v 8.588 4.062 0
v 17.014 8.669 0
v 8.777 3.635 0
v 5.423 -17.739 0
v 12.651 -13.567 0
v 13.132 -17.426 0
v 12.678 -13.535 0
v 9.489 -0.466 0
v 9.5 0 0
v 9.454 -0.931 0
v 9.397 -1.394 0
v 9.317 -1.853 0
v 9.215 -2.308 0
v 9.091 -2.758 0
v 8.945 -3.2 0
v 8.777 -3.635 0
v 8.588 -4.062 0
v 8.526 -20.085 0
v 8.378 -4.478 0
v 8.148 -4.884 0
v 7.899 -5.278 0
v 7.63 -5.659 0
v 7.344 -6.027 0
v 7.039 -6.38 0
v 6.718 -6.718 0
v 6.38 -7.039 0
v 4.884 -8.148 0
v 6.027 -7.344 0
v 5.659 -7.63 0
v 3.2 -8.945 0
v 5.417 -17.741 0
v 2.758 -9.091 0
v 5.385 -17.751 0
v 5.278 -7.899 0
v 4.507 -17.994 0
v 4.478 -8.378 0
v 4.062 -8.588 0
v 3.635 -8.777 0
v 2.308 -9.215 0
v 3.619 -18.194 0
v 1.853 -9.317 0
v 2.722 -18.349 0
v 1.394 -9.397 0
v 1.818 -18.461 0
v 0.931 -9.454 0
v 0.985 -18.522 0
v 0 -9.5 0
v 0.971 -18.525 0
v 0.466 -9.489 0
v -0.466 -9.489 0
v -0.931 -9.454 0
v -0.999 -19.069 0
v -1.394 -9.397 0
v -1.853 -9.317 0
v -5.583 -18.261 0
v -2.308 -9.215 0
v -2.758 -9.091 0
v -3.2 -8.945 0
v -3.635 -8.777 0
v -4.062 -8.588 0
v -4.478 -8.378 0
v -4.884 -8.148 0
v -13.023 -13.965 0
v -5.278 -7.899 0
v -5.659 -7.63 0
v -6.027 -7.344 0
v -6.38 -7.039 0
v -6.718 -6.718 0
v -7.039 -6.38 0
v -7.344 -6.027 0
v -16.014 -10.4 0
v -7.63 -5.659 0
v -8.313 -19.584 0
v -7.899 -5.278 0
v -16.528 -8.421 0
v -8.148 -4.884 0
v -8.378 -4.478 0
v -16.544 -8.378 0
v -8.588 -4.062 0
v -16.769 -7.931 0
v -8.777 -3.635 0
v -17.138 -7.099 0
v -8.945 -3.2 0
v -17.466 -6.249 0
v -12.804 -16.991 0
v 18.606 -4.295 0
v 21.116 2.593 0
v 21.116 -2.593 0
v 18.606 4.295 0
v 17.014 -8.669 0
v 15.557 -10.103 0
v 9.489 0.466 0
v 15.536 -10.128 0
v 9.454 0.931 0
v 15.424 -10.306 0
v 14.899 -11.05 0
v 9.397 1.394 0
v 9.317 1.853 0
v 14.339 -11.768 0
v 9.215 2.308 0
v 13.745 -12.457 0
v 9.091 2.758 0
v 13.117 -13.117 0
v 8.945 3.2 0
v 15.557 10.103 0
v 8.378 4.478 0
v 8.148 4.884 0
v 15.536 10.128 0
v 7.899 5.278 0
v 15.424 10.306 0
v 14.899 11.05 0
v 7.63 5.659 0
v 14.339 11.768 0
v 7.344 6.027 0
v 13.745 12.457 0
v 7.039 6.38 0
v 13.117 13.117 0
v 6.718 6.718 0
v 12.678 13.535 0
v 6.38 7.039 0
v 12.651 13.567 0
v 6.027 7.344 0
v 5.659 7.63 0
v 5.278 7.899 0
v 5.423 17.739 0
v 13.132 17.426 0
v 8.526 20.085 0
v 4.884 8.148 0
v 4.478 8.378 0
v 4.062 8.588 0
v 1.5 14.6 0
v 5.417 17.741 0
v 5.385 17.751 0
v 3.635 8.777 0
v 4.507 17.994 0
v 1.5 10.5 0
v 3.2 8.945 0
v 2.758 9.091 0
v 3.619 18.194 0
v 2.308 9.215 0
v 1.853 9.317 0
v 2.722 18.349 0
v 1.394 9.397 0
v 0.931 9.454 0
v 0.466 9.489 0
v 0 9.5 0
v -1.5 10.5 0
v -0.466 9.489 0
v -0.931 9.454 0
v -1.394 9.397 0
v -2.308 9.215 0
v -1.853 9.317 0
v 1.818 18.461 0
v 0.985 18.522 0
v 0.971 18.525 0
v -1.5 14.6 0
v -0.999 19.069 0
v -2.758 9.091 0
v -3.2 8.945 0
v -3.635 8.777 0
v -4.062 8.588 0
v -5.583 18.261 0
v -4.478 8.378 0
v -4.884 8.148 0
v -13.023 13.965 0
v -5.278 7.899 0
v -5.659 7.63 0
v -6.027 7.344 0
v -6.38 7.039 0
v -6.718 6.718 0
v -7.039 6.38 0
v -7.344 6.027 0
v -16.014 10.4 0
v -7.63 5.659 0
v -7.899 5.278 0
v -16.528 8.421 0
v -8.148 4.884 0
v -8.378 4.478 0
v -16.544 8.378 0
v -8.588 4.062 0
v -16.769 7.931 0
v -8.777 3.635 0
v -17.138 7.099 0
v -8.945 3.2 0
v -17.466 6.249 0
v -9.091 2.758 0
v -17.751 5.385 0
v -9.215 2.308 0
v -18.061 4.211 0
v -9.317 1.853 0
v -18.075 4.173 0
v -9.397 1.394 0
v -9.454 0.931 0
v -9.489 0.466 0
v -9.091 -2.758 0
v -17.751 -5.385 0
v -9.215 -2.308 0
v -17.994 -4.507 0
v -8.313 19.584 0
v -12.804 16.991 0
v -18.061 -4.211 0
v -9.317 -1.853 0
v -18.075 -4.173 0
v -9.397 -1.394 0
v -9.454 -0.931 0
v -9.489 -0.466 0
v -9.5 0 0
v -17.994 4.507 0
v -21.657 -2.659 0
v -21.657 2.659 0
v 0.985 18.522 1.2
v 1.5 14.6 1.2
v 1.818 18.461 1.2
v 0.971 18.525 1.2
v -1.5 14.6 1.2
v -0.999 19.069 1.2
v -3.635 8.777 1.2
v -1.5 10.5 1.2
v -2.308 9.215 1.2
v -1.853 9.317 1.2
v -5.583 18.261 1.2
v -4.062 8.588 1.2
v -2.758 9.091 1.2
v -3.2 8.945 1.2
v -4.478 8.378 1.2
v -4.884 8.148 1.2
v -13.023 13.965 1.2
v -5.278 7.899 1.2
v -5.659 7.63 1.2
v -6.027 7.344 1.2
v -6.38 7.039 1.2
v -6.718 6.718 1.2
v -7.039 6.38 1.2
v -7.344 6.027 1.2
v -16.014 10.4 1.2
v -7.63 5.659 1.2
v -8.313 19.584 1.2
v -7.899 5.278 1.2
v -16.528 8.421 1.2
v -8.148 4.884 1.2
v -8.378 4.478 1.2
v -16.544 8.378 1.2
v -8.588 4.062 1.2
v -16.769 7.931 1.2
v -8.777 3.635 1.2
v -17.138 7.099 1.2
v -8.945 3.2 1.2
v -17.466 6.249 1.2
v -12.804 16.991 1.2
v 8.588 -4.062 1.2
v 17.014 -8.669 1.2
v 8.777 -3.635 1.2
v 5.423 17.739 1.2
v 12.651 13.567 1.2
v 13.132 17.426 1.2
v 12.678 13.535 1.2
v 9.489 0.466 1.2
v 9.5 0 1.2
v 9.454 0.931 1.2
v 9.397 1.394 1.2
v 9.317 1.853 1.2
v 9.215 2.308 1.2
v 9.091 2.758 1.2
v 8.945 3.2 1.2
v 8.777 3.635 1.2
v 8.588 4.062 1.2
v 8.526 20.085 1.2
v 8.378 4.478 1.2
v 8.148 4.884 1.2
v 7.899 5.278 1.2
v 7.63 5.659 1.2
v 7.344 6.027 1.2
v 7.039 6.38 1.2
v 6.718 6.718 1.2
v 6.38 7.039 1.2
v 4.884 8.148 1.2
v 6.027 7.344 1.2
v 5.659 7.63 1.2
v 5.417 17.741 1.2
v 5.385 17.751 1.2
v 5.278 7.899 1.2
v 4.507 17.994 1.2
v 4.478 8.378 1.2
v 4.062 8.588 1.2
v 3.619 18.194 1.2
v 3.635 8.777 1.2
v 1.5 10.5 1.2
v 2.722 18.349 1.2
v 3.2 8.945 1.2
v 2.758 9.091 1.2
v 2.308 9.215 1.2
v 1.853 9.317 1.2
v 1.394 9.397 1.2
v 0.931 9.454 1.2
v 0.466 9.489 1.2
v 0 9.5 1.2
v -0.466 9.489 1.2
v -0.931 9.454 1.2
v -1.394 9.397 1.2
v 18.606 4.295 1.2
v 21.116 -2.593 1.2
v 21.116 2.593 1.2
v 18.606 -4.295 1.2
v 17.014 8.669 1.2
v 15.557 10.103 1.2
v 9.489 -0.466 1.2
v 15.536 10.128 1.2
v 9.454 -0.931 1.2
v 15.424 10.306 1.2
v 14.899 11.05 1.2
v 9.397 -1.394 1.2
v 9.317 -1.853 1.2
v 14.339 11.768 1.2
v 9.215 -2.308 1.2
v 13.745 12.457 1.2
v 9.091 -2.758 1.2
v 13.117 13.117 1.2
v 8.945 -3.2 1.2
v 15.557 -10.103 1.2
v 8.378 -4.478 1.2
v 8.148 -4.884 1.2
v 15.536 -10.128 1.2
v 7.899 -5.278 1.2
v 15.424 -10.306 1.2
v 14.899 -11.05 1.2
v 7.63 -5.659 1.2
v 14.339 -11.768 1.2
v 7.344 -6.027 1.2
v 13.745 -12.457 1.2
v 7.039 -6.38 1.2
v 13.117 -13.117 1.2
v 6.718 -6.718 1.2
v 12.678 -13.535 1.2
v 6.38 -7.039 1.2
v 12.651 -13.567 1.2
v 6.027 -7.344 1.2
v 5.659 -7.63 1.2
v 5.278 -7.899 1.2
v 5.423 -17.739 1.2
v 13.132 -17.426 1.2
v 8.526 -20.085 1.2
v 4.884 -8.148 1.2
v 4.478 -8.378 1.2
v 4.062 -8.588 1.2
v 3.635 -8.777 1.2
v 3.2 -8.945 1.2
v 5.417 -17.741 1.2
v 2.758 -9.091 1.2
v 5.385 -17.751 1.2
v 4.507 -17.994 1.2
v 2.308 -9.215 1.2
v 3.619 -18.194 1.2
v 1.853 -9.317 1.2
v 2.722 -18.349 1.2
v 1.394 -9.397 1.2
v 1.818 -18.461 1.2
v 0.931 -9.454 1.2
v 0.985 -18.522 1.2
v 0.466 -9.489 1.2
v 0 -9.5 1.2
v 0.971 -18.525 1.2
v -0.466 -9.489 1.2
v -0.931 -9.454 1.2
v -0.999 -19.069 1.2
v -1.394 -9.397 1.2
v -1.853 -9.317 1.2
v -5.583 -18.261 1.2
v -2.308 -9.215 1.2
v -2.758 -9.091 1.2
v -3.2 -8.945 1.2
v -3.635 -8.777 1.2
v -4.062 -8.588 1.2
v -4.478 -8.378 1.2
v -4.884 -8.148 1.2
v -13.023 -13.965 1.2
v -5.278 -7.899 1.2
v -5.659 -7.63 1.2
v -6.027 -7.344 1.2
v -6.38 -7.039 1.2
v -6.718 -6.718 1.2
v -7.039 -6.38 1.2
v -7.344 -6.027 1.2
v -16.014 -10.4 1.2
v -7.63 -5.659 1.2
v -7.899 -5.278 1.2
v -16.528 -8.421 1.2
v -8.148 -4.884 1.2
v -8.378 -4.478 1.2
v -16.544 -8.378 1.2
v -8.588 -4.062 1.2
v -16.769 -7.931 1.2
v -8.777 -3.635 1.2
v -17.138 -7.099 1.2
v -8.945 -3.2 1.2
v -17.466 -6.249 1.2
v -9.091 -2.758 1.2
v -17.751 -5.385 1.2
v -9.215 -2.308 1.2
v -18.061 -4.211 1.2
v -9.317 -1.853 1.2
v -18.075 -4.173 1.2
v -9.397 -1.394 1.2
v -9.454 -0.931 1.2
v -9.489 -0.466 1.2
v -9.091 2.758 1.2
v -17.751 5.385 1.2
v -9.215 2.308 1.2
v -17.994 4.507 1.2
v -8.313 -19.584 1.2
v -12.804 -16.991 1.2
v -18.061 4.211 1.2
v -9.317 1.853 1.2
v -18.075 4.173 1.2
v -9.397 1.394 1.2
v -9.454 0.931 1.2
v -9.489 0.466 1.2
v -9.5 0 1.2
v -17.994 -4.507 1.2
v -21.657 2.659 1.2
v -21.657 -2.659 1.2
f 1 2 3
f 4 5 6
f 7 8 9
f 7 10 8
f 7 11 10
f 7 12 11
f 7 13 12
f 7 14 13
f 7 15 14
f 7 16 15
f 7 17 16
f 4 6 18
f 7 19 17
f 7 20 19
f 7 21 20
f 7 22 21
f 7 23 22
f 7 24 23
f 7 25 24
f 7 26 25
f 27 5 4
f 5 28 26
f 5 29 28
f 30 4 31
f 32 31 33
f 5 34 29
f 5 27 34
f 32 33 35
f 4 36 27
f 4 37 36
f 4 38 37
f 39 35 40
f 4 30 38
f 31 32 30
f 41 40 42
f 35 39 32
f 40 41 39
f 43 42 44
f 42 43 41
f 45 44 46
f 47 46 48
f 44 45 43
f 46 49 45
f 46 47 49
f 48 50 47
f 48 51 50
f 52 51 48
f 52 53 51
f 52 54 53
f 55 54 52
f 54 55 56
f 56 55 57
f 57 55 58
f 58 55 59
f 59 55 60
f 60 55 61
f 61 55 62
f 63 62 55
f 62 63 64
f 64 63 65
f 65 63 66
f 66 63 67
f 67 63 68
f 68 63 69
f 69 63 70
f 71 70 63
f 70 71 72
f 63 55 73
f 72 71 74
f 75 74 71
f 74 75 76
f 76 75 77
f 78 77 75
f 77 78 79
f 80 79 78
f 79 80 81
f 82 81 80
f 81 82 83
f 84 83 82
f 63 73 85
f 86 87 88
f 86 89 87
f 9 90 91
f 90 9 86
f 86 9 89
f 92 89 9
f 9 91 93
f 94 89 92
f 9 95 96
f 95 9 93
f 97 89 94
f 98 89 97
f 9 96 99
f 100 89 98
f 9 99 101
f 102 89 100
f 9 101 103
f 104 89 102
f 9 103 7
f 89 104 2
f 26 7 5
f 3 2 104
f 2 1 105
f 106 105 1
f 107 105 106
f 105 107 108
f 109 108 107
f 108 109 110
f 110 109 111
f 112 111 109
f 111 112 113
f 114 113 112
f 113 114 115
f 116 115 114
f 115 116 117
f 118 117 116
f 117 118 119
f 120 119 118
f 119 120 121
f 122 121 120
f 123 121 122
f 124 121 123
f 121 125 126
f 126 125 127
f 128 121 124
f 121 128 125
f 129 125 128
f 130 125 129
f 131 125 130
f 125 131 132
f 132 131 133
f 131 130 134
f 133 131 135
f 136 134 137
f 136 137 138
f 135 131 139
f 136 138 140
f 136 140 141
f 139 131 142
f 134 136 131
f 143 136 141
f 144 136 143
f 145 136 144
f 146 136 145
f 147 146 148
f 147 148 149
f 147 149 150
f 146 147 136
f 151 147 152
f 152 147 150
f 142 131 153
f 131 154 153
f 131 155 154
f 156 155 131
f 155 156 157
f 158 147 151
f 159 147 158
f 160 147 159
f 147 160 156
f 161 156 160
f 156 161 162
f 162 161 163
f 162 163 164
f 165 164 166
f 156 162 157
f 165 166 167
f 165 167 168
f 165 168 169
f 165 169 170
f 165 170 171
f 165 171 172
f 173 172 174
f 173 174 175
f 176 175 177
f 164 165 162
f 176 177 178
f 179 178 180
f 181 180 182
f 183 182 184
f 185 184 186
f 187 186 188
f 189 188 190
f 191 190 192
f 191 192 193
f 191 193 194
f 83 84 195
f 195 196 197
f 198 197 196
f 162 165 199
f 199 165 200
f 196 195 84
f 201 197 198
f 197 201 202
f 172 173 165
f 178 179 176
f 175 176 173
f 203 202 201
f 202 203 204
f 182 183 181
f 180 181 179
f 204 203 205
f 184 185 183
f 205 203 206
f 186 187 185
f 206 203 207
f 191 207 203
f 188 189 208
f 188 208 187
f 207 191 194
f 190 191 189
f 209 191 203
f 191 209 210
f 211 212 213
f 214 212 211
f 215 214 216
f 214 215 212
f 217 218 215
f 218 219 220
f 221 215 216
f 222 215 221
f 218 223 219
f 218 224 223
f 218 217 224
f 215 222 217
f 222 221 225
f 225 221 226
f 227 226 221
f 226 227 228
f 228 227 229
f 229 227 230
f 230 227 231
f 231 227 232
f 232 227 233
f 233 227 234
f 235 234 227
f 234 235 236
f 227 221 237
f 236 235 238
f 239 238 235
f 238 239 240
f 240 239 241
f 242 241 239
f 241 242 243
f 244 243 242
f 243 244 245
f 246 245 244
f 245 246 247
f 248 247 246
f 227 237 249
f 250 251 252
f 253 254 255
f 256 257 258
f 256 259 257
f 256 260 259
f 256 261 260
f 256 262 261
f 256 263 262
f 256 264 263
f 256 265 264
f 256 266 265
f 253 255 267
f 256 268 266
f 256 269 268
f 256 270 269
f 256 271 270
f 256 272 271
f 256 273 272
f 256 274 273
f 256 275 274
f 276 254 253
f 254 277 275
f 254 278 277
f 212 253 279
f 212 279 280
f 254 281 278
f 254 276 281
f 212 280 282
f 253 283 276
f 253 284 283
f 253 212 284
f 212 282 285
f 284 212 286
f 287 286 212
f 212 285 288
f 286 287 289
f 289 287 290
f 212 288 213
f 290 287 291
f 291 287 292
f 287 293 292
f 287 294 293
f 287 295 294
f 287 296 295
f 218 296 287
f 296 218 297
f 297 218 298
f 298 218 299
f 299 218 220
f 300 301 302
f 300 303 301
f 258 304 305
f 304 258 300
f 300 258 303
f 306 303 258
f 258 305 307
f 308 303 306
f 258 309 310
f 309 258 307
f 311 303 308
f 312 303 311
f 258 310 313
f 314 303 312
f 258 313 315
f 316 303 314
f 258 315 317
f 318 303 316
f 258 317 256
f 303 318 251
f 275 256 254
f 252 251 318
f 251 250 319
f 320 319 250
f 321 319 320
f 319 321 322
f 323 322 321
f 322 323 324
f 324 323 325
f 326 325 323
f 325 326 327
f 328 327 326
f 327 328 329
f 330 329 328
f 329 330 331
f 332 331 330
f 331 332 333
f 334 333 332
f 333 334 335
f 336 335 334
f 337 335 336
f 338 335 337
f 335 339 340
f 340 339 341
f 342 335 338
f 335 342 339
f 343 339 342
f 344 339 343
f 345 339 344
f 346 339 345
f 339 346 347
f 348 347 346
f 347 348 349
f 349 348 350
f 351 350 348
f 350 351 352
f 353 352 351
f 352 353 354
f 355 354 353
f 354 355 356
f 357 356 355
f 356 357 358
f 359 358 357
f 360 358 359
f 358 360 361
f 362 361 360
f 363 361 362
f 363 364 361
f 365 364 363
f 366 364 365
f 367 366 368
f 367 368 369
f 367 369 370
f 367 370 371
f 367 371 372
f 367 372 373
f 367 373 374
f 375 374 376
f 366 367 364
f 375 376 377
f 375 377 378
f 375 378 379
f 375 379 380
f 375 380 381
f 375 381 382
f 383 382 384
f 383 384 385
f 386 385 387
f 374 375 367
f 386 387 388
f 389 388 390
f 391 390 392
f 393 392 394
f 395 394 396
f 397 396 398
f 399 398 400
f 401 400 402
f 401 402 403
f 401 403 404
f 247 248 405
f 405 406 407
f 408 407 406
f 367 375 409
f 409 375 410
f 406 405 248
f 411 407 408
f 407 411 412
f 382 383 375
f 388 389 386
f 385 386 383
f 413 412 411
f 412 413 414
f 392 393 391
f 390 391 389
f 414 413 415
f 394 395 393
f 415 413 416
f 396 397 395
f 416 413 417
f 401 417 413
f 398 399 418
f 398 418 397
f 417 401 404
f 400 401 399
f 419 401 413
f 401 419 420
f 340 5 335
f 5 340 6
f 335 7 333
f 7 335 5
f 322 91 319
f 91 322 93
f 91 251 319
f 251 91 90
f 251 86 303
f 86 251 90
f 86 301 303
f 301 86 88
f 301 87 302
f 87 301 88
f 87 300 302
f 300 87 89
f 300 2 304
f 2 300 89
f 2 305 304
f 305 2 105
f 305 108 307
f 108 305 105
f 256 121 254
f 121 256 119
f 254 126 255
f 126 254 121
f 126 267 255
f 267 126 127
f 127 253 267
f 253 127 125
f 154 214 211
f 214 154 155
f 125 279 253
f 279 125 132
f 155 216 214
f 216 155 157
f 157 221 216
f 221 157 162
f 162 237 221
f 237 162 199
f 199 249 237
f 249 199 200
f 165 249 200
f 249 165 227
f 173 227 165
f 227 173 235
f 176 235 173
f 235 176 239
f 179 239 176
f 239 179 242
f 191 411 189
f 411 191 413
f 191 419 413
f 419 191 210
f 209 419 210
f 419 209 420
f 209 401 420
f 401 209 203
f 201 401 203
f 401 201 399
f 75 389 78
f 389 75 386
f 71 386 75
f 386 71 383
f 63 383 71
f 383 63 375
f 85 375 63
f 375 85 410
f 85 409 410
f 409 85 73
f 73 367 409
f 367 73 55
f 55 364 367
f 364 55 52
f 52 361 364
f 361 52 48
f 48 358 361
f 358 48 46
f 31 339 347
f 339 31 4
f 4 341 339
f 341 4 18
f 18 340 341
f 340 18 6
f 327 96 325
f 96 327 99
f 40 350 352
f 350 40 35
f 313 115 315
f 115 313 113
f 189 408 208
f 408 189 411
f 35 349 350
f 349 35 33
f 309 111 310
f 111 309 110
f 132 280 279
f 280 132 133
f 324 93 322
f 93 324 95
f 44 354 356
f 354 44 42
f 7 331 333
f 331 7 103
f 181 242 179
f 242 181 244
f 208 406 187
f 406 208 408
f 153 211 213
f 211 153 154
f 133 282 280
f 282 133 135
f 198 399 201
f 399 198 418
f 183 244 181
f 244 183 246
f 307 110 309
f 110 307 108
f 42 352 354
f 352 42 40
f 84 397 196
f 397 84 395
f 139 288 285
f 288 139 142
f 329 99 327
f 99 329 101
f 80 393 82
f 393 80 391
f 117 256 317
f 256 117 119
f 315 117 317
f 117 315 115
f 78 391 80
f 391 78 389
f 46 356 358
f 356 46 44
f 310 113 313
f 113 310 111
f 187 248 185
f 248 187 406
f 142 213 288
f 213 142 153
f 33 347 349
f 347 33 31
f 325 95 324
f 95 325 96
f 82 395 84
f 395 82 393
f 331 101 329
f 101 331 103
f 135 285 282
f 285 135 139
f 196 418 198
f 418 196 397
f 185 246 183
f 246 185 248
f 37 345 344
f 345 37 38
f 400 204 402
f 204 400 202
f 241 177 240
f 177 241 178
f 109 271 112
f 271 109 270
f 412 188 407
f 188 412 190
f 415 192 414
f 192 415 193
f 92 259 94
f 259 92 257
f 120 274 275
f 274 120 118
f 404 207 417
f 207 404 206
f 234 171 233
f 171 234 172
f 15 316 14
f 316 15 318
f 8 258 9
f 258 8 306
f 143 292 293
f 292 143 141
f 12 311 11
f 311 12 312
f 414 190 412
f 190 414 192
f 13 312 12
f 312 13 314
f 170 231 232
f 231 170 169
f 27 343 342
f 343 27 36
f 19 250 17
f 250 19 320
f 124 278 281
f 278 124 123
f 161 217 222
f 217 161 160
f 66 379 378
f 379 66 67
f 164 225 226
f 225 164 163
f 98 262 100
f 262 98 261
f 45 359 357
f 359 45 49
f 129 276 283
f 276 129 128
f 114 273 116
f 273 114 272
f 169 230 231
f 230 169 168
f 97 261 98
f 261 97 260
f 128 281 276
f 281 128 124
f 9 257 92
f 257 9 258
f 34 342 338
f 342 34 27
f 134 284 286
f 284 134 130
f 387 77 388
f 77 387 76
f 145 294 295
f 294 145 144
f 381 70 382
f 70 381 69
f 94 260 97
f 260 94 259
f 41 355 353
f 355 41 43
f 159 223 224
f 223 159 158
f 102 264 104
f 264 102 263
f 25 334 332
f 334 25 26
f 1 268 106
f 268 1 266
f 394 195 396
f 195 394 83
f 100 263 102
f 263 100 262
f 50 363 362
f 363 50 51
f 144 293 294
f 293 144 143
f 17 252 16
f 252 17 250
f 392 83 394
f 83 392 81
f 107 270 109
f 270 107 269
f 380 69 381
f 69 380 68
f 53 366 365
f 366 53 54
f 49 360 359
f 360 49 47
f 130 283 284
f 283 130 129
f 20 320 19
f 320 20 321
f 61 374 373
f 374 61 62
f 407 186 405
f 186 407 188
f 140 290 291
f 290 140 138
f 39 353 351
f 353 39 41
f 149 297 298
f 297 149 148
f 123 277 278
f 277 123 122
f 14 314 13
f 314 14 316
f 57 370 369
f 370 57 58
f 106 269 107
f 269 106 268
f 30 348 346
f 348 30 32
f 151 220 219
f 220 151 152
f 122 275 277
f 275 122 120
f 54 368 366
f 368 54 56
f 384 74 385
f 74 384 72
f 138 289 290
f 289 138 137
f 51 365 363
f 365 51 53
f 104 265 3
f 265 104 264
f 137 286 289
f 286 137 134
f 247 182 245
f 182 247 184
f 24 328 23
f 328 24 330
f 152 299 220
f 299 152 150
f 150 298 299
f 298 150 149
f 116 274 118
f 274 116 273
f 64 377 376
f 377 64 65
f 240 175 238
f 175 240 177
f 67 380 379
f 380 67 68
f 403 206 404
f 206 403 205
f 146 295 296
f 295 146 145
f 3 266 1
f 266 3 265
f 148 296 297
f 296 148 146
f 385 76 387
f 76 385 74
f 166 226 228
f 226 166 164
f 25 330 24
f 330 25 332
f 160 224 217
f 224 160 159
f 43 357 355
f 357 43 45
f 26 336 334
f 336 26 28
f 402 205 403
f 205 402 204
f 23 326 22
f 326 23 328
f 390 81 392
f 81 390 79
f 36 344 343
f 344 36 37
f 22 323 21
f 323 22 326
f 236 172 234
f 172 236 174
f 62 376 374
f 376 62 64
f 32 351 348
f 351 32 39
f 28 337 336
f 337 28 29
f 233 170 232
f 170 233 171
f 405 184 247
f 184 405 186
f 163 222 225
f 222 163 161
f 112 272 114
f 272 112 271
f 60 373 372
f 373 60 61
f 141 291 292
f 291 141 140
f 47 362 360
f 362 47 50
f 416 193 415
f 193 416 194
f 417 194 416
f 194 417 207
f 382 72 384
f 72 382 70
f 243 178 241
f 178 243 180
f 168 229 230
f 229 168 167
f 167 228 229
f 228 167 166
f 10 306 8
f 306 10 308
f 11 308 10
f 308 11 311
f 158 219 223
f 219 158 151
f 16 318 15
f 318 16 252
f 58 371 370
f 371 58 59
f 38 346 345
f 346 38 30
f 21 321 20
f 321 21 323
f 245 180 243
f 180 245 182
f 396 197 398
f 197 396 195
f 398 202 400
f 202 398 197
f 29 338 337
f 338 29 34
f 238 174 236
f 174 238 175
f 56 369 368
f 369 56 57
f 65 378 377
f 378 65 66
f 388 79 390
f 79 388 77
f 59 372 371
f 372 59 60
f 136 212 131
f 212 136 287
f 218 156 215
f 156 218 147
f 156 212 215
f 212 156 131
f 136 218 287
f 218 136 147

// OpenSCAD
/*
  Elna Supermatic cam 11
  Name: Arrows
  Status: candidate

  Generated from measured parametric base v2.
  Surface mode: stepped
*/

include <_elna_measured_common.scad>;

profile_points = [
        [0.9708, 18.5246],
        [5.4235, 17.7395],
        [8.5258, 20.0854],
        [13.1316, 17.4262],
        [12.6511, 13.5666],
        [15.5573, 10.1031],
        [17.0138, 8.6689],
        [18.6056, 4.2954],
        [21.1164, 2.5928],
        [21.1164, -2.5928],
        [18.6056, -4.2954],
        [17.0138, -8.6689],
        [15.5573, -10.1031],
        [12.6511, -13.5666],
        [13.1316, -17.4262],
        [8.5258, -20.0854],
        [5.4235, -17.7395],
        [0.9708, -18.5246],
        [-0.9994, -19.0688],
        [-5.5828, -18.2606],
        [-8.3128, -19.5837],
        [-12.8036, -16.9910],
        [-13.0228, -13.9652],
        [-16.0144, -10.3999],
        [-16.5282, -8.4215],
        [-18.0746, -4.1728],
        [-21.6574, -2.6592],
        [-21.6574, 2.6592],
        [-18.0746, 4.1728],
        [-16.5282, 8.4215],
        [-16.0144, 10.3999],
        [-13.0228, 13.9652],
        [-12.8036, 16.9910],
        [-8.3128, 19.5837],
        [-5.5828, 18.2606],
        [-0.9994, 19.0688]
];

icon_points = [[-1.000,0.180], [-0.860,0.180], [-0.740,0.740], [-0.620,0.180], [-0.480,0.180], [-0.360,0.740], [-0.240,0.180], [-0.100,0.180], [0.020,0.740], [0.140,0.180], [0.280,0.180], [0.400,0.740], [0.520,0.180], [0.660,0.180], [0.780,0.740], [0.900,0.180], [1.000,0.180]];

elna_cam_ring(profile_points=profile_points);
